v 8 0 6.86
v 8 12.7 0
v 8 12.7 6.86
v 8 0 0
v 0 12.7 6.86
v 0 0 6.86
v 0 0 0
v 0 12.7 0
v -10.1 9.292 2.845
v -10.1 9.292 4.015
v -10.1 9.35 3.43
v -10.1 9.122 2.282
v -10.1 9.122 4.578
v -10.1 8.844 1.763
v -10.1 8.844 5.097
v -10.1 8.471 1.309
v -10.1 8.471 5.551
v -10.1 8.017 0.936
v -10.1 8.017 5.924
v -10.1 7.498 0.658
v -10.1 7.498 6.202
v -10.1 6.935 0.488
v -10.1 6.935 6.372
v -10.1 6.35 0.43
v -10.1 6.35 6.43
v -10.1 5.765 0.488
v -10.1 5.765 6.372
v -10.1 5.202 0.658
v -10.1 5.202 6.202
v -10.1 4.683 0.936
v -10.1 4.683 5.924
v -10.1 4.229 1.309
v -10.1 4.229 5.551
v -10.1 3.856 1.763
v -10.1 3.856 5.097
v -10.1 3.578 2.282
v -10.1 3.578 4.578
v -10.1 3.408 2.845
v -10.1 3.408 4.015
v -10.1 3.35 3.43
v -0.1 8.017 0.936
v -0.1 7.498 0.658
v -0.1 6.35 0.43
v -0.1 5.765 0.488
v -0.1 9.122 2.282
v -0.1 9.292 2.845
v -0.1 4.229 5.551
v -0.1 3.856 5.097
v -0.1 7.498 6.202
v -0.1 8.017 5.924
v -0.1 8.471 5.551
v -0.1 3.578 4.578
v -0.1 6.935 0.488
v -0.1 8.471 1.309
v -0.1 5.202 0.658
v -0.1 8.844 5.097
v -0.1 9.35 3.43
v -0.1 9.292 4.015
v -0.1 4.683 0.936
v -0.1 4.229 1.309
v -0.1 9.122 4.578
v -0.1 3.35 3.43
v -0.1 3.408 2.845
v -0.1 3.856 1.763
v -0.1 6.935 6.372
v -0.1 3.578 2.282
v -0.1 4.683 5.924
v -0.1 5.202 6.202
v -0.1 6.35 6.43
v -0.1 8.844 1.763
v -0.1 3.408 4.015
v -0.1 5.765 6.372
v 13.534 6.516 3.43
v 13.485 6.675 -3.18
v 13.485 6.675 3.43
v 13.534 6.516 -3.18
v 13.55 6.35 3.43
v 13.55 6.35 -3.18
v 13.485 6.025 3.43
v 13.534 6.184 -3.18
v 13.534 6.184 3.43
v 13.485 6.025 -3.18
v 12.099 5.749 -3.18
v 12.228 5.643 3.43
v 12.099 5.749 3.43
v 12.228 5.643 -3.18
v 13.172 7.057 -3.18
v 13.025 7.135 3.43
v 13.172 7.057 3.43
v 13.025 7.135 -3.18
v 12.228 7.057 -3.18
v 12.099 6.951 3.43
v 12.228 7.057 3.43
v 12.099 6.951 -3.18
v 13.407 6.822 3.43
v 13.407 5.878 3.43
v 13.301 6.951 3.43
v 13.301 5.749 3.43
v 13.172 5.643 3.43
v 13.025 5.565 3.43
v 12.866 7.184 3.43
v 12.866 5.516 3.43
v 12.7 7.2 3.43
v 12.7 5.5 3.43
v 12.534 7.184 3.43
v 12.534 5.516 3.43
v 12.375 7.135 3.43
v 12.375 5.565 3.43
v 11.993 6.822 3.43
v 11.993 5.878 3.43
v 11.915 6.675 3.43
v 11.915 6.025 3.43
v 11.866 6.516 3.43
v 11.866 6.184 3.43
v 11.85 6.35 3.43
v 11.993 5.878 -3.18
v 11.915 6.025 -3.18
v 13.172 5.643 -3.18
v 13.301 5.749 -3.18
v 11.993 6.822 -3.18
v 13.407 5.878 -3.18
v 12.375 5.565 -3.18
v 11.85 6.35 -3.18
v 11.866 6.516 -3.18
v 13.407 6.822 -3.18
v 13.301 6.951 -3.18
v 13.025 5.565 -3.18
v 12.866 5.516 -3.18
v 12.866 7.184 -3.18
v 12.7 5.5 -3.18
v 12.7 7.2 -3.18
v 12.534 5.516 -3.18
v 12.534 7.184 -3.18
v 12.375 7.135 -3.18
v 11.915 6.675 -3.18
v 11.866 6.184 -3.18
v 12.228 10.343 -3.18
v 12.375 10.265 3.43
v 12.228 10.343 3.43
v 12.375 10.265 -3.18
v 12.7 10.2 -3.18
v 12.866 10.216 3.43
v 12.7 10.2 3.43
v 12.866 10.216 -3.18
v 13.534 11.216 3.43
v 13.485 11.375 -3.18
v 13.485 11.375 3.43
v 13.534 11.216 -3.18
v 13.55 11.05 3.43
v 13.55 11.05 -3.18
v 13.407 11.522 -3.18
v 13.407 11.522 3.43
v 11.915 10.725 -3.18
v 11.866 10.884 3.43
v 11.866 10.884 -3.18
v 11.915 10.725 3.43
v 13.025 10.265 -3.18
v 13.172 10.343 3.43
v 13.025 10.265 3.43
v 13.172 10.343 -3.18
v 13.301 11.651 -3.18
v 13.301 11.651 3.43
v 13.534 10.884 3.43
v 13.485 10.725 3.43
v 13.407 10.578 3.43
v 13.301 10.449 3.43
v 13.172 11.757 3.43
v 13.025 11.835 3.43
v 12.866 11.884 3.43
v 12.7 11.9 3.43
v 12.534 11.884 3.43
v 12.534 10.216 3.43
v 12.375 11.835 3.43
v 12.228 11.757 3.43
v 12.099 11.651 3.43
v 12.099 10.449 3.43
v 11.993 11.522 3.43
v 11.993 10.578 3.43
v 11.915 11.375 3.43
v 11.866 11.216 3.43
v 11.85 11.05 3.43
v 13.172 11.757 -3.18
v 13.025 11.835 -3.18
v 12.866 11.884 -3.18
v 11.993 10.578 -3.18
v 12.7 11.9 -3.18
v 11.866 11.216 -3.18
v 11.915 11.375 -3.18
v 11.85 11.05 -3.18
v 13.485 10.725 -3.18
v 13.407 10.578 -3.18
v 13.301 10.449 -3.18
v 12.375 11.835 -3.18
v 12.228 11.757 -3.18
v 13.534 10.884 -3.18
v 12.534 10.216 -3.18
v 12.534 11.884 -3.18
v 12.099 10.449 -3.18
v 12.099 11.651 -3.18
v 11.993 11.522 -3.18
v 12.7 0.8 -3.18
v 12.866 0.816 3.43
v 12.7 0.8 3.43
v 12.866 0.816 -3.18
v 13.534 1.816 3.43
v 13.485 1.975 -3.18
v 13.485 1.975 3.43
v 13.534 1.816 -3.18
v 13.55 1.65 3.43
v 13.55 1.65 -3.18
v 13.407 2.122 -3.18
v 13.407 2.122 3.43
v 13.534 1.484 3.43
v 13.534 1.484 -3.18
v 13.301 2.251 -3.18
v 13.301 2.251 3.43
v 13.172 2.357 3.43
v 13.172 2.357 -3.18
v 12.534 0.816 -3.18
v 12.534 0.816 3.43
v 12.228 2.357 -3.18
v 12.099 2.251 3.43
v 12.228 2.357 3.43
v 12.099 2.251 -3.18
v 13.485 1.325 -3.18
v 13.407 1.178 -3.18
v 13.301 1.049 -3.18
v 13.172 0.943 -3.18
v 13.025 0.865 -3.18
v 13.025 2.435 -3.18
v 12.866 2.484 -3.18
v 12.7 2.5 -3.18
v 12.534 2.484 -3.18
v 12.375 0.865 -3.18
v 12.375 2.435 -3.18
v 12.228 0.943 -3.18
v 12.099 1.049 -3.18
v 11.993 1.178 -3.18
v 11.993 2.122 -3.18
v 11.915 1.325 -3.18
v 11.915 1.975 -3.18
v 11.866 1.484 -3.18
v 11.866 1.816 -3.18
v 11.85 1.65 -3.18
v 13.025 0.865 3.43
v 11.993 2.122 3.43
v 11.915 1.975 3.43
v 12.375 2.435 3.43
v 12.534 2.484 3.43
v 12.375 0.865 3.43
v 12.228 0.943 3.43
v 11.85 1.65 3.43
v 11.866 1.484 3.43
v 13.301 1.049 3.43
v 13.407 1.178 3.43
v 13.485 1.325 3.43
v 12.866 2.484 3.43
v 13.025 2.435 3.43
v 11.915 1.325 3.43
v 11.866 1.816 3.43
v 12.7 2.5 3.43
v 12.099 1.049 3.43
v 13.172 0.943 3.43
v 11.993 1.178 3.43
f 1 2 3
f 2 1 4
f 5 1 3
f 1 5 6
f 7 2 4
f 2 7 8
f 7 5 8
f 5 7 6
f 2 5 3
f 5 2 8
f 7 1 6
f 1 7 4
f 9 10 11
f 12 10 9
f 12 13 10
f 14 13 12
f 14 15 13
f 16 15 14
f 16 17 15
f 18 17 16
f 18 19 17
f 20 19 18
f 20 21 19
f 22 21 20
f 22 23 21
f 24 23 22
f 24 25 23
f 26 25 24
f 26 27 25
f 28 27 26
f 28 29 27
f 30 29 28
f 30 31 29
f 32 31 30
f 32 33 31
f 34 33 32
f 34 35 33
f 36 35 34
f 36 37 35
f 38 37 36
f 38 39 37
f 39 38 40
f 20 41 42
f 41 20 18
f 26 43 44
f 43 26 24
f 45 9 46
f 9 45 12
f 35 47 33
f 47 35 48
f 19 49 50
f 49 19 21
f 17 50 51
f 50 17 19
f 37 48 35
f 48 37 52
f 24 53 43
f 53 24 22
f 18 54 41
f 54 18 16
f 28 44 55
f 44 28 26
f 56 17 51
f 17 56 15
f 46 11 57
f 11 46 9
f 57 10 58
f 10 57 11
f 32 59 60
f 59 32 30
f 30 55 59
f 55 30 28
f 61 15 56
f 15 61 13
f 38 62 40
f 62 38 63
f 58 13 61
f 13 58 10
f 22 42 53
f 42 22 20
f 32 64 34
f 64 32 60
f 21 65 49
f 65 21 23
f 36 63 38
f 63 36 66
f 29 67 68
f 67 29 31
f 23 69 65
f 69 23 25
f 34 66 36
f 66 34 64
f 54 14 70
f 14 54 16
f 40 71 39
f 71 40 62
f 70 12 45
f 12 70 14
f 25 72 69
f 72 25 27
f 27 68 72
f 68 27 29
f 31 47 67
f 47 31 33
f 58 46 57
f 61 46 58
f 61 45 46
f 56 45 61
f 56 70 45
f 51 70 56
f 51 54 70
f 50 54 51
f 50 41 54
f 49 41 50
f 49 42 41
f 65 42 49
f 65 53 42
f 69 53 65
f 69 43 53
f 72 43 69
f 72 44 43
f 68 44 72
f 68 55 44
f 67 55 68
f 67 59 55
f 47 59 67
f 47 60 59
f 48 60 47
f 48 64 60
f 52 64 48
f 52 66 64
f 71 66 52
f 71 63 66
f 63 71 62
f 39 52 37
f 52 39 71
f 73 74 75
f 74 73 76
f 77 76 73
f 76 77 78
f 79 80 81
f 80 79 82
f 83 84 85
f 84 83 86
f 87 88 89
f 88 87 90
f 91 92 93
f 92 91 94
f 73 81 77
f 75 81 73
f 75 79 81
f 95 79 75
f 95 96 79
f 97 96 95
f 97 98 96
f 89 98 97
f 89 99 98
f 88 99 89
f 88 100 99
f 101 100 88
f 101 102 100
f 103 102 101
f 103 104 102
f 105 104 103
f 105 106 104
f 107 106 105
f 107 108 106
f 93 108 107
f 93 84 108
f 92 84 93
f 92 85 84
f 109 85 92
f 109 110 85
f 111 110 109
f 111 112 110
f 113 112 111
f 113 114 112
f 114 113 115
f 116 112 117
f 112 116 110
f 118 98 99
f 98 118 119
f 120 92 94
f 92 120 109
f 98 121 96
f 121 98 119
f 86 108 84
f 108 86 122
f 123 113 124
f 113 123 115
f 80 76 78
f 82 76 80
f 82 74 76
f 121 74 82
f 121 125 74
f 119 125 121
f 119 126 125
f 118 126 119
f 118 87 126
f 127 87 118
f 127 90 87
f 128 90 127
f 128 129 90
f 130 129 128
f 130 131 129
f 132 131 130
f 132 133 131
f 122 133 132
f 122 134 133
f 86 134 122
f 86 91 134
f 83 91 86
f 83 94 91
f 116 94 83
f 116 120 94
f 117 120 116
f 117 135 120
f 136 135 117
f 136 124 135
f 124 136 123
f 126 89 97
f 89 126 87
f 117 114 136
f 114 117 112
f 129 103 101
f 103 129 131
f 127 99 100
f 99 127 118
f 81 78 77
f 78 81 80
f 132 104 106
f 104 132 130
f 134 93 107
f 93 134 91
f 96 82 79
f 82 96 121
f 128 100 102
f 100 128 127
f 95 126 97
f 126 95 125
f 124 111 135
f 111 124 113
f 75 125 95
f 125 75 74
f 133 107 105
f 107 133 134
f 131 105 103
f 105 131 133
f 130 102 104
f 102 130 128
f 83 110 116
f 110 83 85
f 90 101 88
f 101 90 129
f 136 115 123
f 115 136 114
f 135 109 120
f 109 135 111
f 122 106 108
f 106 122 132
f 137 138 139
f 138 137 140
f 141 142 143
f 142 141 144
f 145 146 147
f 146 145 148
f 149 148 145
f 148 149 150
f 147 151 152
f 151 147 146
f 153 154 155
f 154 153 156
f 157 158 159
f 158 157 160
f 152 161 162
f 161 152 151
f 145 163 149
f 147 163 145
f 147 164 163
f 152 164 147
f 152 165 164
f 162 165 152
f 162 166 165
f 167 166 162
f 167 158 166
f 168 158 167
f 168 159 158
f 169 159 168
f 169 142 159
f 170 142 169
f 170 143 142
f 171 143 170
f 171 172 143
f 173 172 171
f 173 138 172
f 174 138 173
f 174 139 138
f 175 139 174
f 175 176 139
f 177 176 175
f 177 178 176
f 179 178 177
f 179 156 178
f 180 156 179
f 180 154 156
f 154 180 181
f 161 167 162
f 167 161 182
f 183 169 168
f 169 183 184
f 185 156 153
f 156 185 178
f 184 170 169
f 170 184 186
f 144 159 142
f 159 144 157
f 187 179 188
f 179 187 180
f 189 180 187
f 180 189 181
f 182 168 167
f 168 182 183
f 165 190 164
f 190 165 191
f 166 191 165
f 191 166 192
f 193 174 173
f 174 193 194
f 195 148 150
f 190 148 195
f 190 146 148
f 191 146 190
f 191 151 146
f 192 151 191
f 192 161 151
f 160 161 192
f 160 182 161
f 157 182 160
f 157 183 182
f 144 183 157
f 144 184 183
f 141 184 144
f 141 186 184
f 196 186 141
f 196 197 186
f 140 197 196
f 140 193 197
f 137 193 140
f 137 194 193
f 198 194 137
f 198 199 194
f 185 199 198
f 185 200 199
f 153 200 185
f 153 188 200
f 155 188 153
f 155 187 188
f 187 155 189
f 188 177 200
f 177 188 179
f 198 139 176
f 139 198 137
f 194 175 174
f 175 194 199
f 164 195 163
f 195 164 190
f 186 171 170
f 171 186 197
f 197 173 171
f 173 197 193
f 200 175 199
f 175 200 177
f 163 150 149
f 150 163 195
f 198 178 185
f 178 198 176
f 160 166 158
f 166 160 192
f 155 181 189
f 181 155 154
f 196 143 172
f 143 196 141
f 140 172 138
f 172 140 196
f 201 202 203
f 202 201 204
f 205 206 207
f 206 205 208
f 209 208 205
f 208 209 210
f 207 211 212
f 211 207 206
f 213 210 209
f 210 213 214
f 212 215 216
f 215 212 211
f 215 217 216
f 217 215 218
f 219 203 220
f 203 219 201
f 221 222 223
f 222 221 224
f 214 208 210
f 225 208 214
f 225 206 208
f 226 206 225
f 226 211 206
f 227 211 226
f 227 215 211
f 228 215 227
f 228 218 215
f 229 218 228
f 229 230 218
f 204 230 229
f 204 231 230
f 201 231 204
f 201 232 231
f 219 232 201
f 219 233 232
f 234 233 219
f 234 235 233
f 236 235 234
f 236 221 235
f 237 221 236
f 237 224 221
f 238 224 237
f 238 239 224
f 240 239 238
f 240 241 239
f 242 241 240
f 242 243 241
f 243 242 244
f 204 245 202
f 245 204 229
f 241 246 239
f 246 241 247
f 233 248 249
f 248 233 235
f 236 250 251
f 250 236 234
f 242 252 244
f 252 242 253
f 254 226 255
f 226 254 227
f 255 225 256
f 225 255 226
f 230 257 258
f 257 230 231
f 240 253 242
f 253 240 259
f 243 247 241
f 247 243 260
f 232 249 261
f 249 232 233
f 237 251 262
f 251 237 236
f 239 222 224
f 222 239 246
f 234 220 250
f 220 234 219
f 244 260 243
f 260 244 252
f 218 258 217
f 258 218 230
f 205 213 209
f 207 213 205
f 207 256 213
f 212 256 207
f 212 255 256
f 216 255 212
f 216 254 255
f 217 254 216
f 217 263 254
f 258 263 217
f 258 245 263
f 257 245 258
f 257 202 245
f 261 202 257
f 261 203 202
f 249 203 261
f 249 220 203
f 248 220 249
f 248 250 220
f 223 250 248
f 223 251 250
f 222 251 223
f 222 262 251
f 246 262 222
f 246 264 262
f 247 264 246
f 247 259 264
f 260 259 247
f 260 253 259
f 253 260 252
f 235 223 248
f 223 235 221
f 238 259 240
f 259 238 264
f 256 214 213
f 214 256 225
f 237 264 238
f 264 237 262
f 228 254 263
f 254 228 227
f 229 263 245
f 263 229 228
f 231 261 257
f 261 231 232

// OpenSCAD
$fn=32;
mm=25.4;
e=0.1;

b_len = 8;
b_wid = 12.7;
b_hgt = 6.86;

stem_len = 10;
stem_dia = 6.35;

pin_dia = 1.7;
pin_len = 3.18;

module pin_at(x,y) {
  translate( [x, y, -pin_len])
    cylinder( d=pin_dia, h=pin_len+b_hgt/2);
}

cube( [b_len, b_wid, b_hgt]);
translate( [-stem_len-e, b_wid/2, b_hgt/2])
rotate( [0, 90, 0])
cylinder( d=6, h=10);

pin_at( b_wid, b_wid/2);
pin_at( b_wid, b_wid/2+4.7);
pin_at( b_wid, b_wid/2-4.7);
